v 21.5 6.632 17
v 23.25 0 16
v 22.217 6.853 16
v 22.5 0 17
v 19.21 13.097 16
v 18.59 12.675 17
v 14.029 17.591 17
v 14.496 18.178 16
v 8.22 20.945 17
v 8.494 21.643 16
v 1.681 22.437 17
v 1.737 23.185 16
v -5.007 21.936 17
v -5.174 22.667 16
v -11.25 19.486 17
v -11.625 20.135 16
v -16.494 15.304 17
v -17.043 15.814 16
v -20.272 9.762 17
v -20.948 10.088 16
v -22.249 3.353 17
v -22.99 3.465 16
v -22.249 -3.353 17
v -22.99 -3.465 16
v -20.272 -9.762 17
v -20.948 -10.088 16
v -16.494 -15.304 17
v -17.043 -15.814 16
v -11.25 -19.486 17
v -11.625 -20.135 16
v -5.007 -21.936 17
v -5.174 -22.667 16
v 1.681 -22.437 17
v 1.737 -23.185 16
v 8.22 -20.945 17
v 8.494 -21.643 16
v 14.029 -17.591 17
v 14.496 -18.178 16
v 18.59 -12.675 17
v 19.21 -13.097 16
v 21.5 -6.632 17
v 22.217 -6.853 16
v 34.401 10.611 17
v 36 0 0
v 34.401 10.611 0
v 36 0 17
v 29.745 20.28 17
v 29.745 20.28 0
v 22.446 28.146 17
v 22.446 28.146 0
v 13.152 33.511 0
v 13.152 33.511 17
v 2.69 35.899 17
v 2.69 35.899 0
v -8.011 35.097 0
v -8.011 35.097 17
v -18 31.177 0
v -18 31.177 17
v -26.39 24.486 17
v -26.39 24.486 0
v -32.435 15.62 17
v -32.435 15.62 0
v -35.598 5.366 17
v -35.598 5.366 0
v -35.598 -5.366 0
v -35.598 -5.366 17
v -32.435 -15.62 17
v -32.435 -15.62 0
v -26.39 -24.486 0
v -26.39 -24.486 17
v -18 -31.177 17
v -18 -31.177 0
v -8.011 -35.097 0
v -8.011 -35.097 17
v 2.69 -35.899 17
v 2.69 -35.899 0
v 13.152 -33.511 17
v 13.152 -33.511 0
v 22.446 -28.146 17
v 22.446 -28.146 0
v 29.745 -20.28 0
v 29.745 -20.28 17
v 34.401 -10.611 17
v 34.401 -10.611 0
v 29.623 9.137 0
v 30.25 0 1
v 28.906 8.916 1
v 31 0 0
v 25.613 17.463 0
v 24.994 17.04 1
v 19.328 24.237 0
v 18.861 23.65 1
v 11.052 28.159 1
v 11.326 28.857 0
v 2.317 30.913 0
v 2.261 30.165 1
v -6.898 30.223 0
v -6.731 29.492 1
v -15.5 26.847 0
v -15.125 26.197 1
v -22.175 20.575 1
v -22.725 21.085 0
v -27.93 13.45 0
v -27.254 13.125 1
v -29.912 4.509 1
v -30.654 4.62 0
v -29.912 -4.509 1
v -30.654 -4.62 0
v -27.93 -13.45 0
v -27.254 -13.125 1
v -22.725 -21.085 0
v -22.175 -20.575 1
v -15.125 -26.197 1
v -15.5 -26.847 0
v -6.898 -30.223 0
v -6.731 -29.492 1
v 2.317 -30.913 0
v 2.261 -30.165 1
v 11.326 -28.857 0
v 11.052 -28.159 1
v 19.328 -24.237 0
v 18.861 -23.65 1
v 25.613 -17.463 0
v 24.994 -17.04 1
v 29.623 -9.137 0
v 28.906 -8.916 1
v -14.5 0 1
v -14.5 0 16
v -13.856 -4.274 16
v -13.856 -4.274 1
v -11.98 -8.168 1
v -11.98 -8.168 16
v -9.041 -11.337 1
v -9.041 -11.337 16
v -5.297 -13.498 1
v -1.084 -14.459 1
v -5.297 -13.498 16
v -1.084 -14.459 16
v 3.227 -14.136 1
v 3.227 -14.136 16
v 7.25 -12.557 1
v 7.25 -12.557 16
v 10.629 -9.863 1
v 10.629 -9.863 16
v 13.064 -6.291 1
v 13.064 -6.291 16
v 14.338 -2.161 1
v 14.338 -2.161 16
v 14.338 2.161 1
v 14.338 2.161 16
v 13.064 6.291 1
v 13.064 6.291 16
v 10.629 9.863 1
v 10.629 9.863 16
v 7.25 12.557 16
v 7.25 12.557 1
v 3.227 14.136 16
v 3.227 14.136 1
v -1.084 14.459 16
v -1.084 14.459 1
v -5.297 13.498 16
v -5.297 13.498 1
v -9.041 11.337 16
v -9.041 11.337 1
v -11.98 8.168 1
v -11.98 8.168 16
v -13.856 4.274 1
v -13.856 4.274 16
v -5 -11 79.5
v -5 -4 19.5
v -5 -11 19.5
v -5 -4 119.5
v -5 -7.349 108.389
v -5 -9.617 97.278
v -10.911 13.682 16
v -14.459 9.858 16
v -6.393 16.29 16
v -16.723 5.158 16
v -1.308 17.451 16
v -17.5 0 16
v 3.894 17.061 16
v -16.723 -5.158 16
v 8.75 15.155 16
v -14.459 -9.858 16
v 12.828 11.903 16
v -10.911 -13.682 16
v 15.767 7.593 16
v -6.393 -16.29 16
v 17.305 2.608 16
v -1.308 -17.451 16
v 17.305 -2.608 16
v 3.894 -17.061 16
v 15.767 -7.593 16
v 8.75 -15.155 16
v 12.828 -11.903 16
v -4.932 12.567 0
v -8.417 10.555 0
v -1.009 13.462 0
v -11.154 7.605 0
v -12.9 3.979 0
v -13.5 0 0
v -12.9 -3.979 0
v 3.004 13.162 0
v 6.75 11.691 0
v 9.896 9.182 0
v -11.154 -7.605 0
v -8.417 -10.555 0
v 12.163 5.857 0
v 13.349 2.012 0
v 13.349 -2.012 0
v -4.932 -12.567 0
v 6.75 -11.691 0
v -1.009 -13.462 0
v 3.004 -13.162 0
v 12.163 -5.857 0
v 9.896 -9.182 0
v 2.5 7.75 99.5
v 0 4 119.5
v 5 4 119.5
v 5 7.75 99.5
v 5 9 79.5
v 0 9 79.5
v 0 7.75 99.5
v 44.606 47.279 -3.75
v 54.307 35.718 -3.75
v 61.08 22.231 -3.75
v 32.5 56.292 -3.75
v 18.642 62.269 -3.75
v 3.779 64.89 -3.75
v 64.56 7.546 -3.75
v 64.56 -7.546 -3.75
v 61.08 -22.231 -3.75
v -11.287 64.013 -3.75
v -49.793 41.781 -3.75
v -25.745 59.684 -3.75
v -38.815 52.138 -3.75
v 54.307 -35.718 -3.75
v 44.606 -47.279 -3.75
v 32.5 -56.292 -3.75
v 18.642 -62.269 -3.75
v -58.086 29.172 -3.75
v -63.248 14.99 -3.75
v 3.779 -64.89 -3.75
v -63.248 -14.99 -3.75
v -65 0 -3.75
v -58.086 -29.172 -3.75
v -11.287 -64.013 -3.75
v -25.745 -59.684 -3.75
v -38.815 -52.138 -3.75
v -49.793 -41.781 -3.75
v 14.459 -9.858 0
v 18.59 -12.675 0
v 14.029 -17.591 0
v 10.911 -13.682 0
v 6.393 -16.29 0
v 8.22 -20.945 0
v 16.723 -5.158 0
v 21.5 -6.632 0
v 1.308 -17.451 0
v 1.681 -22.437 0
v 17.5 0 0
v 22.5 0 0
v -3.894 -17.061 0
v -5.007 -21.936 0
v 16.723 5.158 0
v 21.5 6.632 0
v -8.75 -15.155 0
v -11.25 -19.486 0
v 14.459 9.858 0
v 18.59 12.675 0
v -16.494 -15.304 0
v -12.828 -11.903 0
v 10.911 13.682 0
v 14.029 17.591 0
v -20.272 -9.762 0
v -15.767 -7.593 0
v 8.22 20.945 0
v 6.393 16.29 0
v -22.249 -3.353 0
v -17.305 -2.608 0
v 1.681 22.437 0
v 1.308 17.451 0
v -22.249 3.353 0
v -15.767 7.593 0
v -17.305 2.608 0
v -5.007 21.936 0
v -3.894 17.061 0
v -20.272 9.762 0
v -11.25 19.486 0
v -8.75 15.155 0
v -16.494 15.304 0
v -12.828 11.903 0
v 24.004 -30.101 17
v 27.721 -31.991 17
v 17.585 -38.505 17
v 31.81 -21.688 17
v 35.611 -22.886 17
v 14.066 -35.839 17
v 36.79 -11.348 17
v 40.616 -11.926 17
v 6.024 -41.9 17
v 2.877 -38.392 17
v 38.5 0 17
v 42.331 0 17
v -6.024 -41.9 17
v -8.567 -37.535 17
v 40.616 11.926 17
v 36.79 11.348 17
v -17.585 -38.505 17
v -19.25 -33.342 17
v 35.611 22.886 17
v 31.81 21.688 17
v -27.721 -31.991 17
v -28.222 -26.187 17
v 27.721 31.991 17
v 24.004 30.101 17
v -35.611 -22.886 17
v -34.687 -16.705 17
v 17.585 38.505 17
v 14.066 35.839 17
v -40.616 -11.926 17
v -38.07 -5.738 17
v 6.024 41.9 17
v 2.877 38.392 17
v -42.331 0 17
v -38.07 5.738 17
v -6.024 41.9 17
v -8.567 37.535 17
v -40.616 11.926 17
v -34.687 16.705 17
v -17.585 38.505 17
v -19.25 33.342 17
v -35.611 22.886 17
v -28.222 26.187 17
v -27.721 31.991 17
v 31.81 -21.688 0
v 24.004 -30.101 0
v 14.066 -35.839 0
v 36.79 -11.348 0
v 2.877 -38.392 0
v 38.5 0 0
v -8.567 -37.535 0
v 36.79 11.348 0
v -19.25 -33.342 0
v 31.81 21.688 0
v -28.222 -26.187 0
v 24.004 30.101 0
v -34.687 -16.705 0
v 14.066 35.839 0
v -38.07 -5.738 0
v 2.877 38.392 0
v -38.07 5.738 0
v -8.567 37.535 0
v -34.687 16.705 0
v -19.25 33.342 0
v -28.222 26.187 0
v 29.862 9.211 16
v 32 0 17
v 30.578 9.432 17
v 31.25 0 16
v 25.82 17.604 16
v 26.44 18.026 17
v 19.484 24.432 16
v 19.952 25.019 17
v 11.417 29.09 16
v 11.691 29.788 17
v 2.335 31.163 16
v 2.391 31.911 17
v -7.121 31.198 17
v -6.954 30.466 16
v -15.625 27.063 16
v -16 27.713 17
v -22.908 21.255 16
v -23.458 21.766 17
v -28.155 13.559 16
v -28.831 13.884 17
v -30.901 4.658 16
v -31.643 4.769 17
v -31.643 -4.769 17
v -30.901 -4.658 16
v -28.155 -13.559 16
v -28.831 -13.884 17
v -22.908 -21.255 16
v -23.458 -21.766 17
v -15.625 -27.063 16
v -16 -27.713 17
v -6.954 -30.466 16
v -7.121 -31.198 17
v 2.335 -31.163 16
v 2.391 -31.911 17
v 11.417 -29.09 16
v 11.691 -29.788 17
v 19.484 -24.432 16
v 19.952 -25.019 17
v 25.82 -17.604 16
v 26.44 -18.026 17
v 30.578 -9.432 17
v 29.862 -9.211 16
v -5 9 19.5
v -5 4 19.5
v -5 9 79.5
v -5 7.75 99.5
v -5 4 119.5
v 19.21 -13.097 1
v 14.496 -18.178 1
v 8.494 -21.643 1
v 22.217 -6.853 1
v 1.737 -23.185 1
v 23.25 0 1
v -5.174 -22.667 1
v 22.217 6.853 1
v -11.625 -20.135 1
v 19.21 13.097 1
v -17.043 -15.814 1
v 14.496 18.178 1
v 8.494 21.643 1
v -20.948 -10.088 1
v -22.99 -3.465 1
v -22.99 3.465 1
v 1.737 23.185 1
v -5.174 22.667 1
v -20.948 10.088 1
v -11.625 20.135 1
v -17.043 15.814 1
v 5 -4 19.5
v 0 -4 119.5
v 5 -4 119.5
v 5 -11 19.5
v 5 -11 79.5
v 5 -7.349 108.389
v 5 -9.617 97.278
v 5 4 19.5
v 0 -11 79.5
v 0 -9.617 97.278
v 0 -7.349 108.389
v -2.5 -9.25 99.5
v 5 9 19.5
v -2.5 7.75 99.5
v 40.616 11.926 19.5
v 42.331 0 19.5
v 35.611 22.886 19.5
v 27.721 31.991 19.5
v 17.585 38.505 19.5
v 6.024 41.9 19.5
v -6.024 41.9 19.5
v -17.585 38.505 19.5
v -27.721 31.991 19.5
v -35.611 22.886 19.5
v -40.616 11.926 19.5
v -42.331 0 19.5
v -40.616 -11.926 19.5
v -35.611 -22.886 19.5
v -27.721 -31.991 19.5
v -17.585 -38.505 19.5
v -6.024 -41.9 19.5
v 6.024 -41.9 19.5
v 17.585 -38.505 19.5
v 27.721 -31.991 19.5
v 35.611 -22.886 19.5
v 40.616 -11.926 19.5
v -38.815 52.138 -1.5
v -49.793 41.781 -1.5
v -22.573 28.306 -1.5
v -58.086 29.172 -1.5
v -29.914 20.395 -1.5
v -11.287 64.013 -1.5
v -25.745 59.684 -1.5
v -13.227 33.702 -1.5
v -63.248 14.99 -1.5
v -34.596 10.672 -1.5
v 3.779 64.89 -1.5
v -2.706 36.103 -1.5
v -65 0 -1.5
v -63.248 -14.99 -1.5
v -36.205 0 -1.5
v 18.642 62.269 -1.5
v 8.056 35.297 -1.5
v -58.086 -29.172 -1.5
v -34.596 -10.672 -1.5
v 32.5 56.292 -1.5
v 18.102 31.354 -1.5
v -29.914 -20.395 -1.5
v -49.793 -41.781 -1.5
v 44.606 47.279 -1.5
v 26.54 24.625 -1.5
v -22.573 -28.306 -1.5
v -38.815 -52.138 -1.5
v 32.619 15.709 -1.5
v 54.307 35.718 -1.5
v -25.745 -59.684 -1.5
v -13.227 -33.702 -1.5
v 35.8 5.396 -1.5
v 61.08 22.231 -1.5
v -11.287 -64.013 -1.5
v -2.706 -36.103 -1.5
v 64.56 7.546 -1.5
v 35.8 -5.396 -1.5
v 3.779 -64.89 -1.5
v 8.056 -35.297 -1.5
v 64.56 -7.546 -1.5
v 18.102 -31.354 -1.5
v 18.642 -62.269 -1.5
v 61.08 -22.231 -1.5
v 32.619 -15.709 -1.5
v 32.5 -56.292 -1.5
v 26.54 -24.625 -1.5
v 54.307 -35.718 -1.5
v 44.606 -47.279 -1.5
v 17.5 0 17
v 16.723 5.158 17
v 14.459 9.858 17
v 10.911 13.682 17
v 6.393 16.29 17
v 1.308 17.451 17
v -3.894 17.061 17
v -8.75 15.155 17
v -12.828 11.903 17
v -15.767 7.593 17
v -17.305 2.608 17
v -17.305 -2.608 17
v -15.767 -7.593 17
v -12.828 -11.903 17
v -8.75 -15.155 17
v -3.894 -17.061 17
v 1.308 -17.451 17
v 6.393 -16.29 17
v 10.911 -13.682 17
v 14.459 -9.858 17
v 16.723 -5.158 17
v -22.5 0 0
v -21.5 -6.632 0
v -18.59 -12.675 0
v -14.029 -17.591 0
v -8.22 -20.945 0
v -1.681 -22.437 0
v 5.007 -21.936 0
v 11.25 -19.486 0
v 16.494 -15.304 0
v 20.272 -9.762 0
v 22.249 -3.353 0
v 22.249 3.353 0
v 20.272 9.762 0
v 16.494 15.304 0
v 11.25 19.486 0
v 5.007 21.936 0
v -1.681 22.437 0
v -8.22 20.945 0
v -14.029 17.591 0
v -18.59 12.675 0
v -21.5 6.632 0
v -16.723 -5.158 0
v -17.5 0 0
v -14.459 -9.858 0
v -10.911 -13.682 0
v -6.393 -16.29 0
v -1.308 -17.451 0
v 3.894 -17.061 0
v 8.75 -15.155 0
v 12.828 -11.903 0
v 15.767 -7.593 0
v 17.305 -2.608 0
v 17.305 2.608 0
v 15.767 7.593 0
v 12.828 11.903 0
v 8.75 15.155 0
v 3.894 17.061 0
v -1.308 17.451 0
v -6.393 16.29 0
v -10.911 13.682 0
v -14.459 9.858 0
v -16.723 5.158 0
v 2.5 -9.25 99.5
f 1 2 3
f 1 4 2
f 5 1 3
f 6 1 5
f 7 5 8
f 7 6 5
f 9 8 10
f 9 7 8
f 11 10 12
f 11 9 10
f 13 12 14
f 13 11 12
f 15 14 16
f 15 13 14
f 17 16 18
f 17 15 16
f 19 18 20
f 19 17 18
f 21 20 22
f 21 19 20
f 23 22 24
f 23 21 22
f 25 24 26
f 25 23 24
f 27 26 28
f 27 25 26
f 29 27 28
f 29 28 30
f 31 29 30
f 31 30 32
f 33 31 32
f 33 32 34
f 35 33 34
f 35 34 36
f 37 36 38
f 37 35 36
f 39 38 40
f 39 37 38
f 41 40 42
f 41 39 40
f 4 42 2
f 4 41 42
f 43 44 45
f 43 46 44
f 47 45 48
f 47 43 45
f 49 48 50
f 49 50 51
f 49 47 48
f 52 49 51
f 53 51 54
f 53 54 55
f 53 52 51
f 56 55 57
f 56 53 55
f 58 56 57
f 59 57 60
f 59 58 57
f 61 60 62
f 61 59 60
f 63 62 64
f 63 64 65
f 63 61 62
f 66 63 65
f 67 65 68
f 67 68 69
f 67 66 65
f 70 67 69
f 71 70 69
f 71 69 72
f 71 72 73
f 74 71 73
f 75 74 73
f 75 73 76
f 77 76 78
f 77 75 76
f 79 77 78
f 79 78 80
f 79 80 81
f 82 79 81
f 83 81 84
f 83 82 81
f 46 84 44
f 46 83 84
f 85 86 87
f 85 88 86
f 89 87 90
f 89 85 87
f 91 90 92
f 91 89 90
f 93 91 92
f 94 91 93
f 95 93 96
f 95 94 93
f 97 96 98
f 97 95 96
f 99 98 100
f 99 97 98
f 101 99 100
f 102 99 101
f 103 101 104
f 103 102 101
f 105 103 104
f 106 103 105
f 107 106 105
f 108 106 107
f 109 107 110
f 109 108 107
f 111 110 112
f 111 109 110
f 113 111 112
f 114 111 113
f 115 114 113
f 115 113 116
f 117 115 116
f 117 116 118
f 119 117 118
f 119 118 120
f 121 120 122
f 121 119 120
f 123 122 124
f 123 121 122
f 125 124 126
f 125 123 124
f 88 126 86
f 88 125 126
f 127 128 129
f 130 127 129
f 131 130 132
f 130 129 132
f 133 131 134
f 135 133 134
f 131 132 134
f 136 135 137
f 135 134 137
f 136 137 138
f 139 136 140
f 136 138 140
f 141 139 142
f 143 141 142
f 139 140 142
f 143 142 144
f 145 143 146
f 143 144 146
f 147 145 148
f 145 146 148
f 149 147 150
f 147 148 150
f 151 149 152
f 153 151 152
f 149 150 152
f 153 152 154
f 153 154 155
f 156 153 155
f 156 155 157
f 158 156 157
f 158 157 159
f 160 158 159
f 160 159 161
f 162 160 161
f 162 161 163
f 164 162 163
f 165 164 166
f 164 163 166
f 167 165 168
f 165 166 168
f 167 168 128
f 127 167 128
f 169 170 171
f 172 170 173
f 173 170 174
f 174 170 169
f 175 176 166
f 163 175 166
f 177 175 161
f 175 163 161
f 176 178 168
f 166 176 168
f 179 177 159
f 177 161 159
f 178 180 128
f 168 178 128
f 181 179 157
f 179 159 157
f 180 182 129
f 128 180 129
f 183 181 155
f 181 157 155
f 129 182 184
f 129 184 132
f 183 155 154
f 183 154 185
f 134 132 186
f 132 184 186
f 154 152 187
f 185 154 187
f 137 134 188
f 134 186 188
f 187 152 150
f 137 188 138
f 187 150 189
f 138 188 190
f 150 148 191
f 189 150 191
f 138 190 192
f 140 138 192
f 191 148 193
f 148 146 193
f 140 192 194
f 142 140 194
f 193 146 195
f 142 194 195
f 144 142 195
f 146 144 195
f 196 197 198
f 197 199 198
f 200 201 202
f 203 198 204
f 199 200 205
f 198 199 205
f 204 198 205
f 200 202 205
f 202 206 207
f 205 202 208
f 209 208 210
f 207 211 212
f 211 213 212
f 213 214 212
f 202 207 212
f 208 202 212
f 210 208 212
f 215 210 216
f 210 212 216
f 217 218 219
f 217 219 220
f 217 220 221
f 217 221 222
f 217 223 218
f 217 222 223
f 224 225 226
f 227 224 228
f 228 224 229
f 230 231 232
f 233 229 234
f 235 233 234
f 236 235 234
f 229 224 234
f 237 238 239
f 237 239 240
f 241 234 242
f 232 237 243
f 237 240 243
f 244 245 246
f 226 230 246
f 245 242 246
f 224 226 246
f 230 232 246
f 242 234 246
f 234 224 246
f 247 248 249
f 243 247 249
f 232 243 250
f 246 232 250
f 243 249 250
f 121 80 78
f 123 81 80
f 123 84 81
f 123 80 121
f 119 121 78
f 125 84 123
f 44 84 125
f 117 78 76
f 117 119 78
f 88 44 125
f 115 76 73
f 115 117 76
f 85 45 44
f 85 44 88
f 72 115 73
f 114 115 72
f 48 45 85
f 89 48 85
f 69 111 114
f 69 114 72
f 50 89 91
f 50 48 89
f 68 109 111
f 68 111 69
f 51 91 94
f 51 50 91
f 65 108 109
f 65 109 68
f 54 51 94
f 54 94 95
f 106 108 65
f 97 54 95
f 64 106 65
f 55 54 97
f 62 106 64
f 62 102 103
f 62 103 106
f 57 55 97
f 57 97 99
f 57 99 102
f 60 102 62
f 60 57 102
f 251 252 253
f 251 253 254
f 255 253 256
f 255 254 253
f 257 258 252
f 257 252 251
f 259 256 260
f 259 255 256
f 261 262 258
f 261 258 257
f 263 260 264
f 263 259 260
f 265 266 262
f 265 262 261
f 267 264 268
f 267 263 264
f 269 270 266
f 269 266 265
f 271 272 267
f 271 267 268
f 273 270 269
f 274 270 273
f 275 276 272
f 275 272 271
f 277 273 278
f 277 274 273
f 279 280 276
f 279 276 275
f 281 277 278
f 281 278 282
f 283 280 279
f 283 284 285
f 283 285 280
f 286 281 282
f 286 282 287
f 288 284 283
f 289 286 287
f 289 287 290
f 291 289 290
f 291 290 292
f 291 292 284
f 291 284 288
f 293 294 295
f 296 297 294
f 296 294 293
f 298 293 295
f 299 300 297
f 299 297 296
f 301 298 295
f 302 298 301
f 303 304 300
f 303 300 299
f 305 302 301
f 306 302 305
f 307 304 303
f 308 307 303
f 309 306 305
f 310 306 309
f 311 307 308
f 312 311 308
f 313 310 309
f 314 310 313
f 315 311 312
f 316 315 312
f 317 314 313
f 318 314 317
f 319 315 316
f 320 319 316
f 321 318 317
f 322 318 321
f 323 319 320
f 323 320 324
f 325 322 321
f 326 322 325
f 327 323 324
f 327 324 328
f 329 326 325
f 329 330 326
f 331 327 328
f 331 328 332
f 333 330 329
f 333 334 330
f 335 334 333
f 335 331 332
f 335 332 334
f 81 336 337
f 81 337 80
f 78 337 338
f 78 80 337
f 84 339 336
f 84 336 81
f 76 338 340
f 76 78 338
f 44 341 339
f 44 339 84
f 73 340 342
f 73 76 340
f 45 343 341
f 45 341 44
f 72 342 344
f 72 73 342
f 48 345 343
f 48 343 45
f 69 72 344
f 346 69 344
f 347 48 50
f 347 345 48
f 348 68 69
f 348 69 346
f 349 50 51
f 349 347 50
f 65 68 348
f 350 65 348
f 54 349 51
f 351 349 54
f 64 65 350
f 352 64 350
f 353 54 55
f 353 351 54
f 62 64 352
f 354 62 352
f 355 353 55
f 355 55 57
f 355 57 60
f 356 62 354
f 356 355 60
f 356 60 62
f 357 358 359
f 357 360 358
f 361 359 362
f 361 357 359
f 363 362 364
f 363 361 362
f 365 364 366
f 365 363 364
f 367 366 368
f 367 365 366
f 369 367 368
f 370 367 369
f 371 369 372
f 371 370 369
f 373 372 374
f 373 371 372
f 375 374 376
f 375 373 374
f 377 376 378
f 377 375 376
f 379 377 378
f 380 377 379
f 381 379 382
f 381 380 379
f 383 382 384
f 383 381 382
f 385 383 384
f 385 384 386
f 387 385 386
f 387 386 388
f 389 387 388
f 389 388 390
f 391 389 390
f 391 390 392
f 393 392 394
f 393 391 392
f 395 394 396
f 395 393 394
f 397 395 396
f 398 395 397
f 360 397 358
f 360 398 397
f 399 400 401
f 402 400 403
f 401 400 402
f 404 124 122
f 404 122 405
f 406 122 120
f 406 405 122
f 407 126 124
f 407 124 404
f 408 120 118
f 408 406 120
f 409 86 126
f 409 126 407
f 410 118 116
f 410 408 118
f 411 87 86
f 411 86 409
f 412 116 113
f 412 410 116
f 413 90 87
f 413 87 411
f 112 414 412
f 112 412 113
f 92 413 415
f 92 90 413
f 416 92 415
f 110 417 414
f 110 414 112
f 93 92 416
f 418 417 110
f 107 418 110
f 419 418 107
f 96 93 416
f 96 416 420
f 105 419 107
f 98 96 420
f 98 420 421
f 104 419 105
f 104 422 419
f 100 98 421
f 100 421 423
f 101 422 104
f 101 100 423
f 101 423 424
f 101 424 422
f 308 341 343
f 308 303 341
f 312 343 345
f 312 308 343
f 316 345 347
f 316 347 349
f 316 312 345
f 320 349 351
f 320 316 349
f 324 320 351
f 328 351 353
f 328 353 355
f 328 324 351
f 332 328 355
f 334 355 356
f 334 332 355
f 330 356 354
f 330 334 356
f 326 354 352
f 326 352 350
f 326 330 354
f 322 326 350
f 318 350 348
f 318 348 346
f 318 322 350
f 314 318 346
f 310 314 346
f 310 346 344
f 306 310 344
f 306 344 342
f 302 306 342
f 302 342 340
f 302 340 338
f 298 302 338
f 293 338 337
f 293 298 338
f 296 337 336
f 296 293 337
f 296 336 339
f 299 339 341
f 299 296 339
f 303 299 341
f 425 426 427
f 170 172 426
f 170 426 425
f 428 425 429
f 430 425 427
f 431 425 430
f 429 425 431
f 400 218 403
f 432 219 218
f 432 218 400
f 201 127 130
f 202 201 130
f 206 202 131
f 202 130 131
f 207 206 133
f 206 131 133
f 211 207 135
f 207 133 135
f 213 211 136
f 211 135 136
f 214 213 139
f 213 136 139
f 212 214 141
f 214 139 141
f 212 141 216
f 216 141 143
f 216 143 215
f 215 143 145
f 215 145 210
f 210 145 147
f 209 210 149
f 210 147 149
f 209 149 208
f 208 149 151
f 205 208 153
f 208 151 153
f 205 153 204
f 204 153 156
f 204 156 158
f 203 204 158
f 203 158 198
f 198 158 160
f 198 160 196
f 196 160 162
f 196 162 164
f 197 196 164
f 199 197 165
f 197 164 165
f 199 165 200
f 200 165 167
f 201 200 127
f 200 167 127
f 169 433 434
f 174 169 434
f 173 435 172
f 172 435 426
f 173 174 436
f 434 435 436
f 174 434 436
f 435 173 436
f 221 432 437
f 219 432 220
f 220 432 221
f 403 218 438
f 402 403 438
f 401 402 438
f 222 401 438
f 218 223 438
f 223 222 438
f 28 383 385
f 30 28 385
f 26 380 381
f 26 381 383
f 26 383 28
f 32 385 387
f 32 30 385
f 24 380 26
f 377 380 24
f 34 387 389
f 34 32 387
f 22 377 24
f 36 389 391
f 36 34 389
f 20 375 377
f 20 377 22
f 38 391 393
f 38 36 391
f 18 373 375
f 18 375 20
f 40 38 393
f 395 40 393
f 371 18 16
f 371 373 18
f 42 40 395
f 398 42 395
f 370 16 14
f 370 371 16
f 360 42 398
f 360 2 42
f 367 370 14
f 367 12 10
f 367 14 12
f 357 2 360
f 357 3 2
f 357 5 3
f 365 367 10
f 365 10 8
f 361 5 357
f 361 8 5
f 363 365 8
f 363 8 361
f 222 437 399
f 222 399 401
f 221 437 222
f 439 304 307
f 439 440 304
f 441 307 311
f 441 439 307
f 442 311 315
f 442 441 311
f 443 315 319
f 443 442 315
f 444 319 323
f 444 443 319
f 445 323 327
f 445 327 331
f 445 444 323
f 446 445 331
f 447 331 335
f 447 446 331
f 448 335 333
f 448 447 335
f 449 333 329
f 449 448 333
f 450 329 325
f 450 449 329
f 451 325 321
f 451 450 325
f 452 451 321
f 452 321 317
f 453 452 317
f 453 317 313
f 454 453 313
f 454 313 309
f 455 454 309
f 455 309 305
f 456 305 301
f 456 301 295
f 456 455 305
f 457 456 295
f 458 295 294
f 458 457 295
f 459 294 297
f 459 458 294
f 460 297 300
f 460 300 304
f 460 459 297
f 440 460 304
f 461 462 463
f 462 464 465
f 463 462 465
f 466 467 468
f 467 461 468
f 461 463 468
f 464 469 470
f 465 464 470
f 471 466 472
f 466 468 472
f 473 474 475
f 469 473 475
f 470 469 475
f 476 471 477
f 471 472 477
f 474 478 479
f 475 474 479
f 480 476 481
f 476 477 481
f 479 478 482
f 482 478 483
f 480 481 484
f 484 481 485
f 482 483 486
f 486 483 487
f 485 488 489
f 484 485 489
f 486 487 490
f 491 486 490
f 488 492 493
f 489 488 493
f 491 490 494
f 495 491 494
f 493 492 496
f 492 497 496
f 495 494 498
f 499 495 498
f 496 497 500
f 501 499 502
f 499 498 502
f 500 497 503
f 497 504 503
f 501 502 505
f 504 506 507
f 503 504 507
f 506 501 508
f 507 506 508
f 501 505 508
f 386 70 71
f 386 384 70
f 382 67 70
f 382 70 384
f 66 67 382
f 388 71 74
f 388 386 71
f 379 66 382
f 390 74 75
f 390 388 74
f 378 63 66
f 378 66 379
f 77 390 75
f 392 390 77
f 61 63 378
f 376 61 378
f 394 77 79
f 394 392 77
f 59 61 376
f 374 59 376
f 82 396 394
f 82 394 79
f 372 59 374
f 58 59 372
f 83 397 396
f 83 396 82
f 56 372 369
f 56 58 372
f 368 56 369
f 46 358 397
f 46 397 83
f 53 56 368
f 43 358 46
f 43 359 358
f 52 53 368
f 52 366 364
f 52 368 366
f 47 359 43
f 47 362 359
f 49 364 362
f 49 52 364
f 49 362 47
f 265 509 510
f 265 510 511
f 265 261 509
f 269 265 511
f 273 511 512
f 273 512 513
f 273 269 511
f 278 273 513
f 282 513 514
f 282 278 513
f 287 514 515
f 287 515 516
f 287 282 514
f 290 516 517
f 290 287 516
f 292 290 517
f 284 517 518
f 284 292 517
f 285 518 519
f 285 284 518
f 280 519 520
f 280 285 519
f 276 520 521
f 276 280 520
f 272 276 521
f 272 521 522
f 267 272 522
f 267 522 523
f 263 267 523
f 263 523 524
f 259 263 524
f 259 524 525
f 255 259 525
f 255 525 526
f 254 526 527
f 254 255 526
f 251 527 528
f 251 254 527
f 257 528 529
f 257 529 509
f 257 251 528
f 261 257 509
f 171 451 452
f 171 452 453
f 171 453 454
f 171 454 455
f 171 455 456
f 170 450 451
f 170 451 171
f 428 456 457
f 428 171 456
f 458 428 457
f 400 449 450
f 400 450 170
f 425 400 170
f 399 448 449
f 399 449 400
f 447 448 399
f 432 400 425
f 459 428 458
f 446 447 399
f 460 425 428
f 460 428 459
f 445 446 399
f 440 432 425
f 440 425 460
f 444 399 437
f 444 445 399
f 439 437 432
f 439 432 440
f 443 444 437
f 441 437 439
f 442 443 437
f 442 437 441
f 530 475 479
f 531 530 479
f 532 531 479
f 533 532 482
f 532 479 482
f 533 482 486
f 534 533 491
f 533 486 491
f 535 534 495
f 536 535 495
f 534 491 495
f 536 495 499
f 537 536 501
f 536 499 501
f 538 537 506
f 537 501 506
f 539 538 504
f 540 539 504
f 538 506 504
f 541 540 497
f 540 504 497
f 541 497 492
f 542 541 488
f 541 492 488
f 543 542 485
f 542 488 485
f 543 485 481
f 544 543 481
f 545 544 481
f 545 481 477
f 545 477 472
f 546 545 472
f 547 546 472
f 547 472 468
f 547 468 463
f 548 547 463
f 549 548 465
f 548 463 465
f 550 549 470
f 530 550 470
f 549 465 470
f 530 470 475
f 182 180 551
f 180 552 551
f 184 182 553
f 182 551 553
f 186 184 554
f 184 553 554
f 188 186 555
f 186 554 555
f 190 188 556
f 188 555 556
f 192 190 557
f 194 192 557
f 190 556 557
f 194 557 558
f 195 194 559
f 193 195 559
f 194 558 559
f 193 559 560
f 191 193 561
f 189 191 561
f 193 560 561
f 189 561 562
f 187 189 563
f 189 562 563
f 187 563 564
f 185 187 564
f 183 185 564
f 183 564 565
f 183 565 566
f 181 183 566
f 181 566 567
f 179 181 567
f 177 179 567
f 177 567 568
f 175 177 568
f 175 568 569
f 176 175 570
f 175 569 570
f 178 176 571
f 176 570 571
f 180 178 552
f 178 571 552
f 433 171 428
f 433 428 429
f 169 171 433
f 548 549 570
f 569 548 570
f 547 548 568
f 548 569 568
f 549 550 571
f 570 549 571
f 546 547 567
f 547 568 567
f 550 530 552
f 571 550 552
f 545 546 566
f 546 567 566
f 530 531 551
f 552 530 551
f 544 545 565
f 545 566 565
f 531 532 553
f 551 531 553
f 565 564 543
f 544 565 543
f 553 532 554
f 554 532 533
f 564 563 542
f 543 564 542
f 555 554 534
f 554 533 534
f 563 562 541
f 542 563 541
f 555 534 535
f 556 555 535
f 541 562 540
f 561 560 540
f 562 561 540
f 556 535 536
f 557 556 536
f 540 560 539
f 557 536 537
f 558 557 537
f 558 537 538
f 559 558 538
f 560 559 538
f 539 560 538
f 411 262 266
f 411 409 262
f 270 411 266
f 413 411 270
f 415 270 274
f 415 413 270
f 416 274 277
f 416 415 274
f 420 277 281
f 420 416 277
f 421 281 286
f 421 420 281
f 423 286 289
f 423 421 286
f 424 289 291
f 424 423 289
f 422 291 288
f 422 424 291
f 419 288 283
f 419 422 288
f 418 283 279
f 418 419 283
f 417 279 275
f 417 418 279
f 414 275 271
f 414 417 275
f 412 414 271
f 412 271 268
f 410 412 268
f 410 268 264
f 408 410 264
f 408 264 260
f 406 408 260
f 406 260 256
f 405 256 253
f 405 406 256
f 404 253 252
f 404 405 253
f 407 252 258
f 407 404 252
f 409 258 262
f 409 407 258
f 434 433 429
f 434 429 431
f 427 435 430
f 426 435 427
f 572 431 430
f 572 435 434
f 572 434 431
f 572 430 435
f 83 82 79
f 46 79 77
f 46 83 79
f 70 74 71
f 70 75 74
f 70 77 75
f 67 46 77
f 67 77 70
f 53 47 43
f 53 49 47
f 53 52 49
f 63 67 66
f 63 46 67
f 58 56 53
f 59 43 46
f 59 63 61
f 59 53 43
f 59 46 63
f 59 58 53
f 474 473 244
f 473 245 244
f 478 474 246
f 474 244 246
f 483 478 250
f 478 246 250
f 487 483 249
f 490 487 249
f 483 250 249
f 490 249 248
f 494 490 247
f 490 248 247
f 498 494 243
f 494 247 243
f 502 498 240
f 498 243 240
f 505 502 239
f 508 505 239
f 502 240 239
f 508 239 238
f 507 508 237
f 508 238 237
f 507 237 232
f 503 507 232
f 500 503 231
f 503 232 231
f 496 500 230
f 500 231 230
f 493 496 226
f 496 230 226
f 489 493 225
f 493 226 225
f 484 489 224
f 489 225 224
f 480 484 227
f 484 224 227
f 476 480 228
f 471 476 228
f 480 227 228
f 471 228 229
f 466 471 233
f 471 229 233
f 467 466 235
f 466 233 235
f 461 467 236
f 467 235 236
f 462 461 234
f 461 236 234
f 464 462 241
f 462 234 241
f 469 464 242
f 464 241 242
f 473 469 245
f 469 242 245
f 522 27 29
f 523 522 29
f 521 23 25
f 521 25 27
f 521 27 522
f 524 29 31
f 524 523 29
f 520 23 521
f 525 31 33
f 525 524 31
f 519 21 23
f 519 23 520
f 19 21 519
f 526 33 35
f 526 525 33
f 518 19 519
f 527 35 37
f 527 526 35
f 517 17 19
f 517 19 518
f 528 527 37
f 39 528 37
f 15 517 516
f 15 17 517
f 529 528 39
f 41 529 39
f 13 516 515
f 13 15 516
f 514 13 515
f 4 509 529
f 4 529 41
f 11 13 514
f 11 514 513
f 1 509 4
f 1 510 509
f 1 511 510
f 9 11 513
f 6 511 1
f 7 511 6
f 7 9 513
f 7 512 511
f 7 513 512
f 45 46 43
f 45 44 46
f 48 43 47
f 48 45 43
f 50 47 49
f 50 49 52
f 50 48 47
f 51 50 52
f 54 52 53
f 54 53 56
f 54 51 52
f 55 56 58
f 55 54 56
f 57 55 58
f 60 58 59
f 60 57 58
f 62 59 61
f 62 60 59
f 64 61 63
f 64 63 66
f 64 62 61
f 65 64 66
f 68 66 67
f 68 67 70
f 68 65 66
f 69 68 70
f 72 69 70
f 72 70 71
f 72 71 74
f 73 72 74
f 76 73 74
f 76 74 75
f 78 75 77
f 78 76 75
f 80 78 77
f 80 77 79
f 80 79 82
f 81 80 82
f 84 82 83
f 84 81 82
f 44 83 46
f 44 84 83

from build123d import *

# Parameters (mm, degrees)
CHAMFER001_SIZE = 1
PAD_DEPTH       = 5


with BuildPart() as body001:
    # Sketch010 (on XZ_Plane001 of Origin002) → Revolution (revolve)
    with BuildSketch(Plane.XZ):
        Polygon((17.5, 17), (17.5, 0), (22.5, 0), (23.25, 1), (30.25, 1), (31, 0), (36, 0), (36, 17), (32, 17), (31.25, 16), (23.25, 16), (22.5, 17), align=None)
    revolve(axis=Axis((0, 0, 0), (0, 0, 1)))


with BuildPart() as body002:
    # Sketch008 (on XZ_Plane002 of Origin004) → Revolution002 (revolve)
    with BuildSketch(Plane.XZ):
        Polygon((0, 0), (-14.5, 0), (-14.5, 16), (-17.5, 16), (-17.5, 0), (-22.5, 0), (-22.5, -2.5), (0, -2.5), align=None)
    revolve(axis=Axis((0, 0, 0), (0, 0, 1)))

    # Chamfer001
    chamfer001_edges = [body002.edges().sort_by_distance(p)[0] for p in [
        (14.5, 0, 0),
    ]]
    chamfer(chamfer001_edges, length=CHAMFER001_SIZE)

    # Sketch009 (on XZ_Plane002 of Origin004) → Revolution003 (revolve)
    with BuildSketch(Plane.XZ):
        Polygon((-22.5, 0), (-36.2047, -1.5), (-65, -1.5), (-65, -3.75), (0, -3.75), (0, -2.5), (-22.5, -2.5), align=None)
    revolve(axis=Axis((0, 0, 0), (0, 0, 1)))


with BuildPart() as body:
    # Sketch (on XZ_Plane of Origin) → Revolution004 (revolve)
    with BuildSketch(Plane.XZ):
        Polygon((36, 17), (36, 0), (38.5, 0), (38.5, 17), (42.330734, 17), (42.330734, 19.5), (0, 19.5), (0, 17), align=None)
    revolve(axis=Axis((0, 0, 0), (0, 0, 1)))

    # Sketch011 (on YZ_Plane of Origin) → Pad (new body, symmetric)
    with BuildSketch(Plane.YZ):
        with BuildLine():
            Line((-4, 119.5), (-4, 19.5))
            Line((-4, 19.5), (-11, 19.5))
            Line((-11, 19.5), (-11, 79.5))
            add(Edge.make_bspline(
                [(-11, 79.5), (-11, 99.5), (-4, 119.5)],
                knots=[0, 0, 0, 1, 1, 1], degree=2))
        make_face()
        with BuildLine():
            Line((4, 119.5), (4, 19.5))
            Line((4, 19.5), (9, 19.5))
            Line((9, 19.5), (9, 79.5))
            add(Edge.make_bspline(
                [(4, 119.5), (9, 99.5), (9, 79.5)],
                knots=[0, 0, 0, 1, 1, 1], degree=2))
        make_face()
    extrude(amount=PAD_DEPTH, both=True)


solid = Compound([body001.part, body002.part, body.part])
